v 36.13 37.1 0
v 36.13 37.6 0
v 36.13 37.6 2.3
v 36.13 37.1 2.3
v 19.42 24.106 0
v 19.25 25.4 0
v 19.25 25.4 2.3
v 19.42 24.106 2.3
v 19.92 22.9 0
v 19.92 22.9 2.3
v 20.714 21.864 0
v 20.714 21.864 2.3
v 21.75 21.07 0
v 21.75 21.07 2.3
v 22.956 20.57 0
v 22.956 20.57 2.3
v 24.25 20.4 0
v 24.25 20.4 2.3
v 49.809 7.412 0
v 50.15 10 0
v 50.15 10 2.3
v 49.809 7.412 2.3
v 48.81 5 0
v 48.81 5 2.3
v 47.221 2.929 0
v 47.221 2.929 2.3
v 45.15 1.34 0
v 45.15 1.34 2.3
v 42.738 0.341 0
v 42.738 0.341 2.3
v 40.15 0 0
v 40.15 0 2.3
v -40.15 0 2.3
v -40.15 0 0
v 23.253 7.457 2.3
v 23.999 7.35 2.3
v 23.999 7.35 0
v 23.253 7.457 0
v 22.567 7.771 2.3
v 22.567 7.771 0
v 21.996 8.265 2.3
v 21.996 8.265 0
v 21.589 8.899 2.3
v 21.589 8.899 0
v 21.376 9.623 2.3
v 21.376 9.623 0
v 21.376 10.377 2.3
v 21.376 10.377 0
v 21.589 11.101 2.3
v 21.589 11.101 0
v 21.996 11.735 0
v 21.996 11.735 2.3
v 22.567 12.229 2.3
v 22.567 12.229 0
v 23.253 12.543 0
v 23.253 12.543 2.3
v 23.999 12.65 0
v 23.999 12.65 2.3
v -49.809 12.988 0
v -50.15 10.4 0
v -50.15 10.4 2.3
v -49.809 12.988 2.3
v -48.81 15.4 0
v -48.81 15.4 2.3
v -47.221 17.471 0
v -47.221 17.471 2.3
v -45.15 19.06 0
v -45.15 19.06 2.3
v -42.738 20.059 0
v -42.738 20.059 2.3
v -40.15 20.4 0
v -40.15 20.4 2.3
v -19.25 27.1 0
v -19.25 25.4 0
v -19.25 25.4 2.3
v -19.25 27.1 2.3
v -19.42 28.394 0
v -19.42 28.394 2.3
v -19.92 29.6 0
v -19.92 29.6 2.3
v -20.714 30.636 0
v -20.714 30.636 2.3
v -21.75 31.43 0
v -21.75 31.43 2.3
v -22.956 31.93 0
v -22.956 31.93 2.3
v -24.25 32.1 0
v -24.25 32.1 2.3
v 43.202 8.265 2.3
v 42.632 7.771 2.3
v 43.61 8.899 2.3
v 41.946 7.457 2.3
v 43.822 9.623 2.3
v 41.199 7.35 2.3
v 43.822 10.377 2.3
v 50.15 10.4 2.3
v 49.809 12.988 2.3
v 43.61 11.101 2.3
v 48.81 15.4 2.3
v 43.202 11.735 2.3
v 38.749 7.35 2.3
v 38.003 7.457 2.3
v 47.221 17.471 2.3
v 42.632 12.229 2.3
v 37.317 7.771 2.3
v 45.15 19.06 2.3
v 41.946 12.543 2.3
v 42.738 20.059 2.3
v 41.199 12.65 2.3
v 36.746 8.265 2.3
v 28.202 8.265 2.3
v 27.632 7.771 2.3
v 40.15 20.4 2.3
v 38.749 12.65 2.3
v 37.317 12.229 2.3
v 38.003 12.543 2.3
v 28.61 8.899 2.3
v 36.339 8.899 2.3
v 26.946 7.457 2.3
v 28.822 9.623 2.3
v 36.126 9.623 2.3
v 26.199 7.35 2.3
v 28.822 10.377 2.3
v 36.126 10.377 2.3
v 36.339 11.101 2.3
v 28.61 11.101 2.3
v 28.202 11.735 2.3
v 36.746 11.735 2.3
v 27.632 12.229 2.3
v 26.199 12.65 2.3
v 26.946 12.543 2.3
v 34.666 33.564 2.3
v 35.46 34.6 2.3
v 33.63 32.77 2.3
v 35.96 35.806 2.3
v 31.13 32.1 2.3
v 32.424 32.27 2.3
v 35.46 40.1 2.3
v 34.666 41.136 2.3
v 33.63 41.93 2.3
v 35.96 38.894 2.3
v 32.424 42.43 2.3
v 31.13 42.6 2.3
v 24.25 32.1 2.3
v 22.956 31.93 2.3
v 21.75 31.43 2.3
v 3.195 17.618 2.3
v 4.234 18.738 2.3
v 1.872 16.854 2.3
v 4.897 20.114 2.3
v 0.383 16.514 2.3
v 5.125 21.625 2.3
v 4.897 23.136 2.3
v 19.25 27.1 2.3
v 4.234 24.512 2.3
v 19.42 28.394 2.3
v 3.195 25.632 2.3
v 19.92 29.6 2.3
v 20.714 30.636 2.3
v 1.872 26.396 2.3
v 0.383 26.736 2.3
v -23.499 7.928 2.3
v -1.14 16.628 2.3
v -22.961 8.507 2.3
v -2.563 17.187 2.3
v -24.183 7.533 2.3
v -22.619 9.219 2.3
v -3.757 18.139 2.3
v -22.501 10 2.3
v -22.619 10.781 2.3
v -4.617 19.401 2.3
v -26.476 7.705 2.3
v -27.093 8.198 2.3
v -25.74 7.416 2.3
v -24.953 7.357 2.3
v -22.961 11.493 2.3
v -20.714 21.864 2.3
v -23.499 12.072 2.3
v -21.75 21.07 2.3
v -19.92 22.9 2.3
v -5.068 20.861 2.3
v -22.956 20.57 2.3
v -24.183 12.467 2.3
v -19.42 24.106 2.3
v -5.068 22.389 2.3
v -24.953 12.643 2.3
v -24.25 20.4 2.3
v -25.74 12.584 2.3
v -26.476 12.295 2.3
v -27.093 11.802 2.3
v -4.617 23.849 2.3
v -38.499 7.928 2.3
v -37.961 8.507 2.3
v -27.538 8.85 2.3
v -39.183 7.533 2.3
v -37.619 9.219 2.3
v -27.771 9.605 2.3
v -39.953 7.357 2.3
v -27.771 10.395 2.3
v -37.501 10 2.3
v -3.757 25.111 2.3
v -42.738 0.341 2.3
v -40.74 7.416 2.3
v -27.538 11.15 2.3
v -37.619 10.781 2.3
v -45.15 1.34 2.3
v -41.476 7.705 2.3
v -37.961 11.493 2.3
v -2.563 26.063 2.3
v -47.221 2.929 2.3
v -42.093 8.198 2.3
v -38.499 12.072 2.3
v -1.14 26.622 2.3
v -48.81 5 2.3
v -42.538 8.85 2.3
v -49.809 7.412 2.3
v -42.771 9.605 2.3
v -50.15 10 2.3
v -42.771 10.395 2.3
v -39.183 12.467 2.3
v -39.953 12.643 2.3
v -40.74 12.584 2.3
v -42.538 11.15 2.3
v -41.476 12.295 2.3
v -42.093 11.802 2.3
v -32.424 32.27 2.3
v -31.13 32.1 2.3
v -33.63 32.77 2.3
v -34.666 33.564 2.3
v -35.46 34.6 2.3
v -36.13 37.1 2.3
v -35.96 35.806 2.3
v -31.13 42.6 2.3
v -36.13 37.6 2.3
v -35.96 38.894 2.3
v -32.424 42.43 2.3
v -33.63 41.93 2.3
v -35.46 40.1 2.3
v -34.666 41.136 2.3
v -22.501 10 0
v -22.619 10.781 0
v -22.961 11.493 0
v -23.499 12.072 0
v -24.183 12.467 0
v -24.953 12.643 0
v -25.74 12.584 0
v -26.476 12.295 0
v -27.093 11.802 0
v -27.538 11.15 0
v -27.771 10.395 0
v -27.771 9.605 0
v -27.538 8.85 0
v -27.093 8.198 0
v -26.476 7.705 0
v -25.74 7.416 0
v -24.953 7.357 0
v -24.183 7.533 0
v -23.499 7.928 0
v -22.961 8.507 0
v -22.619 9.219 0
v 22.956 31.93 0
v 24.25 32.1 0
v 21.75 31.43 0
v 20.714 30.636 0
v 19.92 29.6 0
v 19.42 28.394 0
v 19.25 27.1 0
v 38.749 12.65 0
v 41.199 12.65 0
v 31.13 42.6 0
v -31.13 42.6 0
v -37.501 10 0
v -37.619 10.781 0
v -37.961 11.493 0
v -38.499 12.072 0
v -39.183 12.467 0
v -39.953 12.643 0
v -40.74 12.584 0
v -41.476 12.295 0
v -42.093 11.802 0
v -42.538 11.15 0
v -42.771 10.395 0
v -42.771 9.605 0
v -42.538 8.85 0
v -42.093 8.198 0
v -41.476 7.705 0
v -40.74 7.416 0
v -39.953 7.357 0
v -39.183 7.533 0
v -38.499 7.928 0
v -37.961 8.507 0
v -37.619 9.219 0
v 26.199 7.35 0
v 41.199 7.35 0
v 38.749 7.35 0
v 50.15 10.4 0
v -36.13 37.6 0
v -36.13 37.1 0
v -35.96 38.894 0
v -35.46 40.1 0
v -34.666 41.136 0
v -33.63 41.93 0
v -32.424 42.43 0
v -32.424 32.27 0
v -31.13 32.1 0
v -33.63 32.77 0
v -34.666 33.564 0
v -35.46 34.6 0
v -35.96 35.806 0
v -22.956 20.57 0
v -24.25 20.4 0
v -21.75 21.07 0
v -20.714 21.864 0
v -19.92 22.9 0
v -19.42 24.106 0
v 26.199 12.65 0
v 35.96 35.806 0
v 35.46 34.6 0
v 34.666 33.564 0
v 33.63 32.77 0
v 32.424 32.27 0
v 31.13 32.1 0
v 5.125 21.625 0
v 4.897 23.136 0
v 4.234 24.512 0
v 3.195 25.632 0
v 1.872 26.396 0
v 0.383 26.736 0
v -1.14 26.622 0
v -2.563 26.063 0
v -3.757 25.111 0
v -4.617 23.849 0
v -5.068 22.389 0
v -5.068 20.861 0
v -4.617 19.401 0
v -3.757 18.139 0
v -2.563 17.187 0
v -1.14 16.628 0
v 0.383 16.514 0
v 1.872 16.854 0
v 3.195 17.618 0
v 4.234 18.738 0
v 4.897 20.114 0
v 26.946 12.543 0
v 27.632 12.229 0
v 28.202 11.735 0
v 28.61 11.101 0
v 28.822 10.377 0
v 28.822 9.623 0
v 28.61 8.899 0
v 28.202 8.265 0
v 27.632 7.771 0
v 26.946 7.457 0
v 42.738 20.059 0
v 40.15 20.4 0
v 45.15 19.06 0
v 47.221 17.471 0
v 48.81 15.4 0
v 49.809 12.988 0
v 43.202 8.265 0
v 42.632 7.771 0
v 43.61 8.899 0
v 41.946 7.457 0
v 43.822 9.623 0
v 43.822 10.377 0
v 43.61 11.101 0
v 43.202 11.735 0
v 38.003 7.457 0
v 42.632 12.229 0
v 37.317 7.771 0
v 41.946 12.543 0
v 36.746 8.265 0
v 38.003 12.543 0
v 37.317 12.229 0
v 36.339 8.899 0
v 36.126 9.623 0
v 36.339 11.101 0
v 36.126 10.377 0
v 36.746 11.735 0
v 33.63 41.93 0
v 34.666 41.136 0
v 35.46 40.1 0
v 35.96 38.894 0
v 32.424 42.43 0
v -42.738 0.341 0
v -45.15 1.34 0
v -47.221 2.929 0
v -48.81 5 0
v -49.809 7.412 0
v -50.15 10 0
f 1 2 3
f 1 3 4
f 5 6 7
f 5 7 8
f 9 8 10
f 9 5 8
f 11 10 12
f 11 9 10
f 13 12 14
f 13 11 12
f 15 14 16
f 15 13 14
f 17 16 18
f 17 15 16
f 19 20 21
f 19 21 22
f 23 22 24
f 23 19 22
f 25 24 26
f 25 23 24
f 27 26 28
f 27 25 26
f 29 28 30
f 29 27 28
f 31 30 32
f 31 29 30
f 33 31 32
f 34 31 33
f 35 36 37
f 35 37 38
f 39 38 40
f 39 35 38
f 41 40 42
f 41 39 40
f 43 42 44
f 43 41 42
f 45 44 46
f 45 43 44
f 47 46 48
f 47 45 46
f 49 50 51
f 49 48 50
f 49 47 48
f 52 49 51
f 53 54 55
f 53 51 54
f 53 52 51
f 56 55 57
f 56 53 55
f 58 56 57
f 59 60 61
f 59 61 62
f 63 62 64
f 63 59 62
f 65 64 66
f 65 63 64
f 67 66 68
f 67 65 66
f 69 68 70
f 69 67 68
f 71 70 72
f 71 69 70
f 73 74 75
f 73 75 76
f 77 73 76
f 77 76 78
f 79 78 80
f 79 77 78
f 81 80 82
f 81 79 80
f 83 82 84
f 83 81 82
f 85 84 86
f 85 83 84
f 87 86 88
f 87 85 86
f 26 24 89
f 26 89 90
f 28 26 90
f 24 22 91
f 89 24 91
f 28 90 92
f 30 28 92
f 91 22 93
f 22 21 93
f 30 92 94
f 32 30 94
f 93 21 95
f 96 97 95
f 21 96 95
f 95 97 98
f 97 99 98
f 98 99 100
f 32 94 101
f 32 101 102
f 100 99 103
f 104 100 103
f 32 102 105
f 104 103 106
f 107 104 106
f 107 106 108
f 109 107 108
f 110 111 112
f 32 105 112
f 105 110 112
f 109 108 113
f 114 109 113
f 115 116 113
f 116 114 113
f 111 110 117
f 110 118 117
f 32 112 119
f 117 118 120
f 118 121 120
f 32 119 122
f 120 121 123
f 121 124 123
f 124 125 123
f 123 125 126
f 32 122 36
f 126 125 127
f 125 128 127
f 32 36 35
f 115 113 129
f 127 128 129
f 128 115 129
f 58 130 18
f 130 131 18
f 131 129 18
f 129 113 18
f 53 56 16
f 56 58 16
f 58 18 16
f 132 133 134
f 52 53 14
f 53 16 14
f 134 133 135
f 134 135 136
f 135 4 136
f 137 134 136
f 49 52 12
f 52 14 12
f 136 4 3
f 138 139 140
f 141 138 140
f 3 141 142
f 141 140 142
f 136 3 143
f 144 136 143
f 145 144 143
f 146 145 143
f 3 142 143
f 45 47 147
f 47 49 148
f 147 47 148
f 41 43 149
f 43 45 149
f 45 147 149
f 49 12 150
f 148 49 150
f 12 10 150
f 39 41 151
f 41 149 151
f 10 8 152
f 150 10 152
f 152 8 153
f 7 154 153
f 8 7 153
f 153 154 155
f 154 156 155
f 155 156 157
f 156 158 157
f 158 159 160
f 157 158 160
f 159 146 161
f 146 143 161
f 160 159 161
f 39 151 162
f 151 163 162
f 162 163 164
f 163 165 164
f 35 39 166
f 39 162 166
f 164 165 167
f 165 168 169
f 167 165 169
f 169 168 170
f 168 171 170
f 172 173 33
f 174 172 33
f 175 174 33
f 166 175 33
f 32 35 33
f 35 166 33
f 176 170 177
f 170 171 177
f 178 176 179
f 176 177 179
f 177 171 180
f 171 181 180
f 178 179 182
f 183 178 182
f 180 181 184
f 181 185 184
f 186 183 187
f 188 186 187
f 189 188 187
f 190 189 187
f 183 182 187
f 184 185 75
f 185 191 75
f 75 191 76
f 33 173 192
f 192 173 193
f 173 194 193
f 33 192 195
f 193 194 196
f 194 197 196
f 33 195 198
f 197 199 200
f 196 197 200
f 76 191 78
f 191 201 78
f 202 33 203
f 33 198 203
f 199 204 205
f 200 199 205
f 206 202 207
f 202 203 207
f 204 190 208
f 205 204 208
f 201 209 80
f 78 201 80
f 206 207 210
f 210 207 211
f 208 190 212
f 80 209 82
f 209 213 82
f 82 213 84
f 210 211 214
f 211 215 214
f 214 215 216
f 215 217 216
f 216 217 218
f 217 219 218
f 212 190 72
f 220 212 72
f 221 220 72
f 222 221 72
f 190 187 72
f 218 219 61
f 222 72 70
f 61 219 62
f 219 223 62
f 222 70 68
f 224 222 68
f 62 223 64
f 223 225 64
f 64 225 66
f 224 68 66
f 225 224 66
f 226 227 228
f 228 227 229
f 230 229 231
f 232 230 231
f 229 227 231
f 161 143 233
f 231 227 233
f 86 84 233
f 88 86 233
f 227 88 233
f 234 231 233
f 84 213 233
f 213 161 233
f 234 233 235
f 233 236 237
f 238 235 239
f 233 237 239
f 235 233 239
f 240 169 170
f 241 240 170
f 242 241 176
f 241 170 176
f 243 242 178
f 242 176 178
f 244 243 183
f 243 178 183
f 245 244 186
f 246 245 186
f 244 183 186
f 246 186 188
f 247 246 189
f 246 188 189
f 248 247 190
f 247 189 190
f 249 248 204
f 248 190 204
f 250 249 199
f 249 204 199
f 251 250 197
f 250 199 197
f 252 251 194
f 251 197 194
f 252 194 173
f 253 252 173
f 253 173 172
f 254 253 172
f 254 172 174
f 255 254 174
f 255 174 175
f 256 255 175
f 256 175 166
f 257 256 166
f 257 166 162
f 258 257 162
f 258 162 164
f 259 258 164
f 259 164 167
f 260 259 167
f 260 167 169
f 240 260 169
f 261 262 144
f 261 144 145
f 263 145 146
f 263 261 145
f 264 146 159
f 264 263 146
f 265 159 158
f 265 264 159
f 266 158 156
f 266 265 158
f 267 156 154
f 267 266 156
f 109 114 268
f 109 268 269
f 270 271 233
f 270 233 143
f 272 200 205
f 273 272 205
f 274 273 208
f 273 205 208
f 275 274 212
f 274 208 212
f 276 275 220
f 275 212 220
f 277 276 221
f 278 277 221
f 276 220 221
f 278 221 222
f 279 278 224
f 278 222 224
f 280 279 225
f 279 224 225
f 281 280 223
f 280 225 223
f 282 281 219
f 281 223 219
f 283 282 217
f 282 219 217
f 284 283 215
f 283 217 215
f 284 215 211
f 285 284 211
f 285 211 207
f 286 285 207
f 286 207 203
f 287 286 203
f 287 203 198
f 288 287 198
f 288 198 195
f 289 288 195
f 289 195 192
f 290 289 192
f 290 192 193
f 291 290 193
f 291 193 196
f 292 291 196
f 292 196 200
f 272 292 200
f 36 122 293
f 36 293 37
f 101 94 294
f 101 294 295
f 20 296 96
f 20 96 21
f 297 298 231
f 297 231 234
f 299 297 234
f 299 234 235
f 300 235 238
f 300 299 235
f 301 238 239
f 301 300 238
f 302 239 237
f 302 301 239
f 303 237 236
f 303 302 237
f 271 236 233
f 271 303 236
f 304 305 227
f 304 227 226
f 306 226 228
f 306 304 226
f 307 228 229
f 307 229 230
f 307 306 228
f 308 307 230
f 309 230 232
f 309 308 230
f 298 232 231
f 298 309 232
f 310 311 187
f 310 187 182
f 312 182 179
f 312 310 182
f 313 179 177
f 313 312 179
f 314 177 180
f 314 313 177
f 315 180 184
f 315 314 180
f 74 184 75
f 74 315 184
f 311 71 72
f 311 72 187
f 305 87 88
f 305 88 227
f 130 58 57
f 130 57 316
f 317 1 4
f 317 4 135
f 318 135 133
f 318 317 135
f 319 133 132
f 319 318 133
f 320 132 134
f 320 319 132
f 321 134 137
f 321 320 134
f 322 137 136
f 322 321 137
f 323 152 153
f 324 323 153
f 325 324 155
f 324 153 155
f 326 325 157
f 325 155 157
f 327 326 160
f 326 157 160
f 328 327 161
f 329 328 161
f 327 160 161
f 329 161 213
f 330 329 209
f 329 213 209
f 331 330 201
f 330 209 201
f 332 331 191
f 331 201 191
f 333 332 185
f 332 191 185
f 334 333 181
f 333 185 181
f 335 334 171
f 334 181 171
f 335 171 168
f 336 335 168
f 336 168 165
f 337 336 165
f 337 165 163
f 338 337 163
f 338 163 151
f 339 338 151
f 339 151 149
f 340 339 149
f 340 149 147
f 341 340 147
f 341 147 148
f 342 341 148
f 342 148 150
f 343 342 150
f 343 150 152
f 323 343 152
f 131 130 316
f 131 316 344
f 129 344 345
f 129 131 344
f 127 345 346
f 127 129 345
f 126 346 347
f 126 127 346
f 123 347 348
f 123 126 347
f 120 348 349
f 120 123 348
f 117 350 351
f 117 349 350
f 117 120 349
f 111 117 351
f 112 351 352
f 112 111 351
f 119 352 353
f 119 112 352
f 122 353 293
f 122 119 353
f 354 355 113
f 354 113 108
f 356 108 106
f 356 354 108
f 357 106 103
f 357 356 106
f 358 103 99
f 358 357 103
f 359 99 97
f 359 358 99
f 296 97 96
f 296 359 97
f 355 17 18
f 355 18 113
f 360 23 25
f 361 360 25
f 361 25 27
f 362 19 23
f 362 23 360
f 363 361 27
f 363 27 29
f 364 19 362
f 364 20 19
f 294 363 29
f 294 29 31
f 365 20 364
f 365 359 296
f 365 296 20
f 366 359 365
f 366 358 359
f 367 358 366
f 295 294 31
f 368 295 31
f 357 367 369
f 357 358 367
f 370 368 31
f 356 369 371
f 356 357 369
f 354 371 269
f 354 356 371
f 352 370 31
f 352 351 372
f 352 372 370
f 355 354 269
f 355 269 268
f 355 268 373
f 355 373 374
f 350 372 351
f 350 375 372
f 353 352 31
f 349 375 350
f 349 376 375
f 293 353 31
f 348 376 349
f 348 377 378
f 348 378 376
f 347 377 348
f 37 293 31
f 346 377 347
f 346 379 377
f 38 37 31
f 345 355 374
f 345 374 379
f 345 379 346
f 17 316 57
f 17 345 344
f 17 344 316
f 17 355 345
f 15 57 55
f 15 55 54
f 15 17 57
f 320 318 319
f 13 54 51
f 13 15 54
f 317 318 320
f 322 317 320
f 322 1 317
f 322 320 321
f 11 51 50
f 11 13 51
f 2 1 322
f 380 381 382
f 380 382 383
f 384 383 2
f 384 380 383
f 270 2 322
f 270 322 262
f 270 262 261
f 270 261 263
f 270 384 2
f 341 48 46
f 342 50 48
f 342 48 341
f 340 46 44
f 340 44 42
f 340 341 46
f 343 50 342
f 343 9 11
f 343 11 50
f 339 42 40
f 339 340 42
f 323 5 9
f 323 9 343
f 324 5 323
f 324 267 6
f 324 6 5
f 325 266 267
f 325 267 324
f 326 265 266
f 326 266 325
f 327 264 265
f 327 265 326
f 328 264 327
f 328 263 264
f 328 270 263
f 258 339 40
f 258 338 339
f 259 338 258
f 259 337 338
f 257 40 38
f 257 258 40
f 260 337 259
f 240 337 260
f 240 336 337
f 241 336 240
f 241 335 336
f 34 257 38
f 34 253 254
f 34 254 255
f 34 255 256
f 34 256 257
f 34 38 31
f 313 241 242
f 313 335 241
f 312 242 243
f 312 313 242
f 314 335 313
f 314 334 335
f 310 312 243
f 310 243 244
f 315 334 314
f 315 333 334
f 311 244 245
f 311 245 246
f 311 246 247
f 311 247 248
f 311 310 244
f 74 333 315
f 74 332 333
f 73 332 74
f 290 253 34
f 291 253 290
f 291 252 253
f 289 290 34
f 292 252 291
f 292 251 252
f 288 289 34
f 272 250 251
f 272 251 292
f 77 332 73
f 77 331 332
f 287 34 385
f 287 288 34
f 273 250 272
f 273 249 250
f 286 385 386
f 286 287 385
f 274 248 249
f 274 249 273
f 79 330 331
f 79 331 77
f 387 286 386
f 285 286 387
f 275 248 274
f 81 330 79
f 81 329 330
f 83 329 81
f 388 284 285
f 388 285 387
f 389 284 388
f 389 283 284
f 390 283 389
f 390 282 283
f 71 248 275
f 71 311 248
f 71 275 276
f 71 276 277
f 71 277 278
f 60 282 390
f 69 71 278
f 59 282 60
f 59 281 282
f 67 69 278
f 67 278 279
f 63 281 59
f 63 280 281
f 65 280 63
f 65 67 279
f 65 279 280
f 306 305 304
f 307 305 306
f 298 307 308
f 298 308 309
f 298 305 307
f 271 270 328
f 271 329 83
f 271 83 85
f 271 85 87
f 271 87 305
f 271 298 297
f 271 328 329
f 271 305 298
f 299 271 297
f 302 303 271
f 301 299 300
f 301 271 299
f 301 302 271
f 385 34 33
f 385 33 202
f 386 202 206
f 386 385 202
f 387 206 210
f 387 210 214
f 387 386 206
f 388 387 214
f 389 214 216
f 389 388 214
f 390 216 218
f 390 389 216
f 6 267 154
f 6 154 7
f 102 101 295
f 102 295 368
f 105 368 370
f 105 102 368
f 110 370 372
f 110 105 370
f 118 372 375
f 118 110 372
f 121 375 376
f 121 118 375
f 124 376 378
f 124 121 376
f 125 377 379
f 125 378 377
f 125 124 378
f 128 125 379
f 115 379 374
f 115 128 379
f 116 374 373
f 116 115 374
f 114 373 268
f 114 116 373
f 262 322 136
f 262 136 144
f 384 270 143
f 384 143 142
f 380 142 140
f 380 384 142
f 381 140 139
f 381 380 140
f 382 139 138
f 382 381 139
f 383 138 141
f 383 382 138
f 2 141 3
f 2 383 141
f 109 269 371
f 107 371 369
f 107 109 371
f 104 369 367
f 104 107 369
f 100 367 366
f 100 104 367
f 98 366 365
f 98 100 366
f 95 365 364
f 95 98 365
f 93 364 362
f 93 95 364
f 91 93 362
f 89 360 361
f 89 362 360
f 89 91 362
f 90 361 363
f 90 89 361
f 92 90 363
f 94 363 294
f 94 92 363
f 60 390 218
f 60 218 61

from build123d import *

# Parameters (mm, degrees)
BOSS_EXTRUDE1_DEPTH = 2.3
CUT_EXTRUDE1_REACH  = 4.3
SKETCH2_R           = 2.65
SKETCH2_R_2         = 5.125


with BuildPart() as part:
    # Sketch1 → Boss-Extrude1 (new body)
    with BuildSketch(Plane.XY):
        with BuildLine():
            Line((40.15, 0), (-40.15, 0))
            ThreePointArc((-40.15, 0), (-47.221067812, 2.928932188), (-50.15, 10))
            Line((-50.15, 10), (-50.15, 10.4))
            ThreePointArc((-50.15, 10.4), (-47.221067812, 17.471067812), (-40.15, 20.4))
            Line((-40.15, 20.4), (-24.25, 20.4))
            ThreePointArc((-24.25, 20.4), (-20.714466094, 21.864466094), (-19.25, 25.4))
            Line((-19.25, 25.4), (-19.25, 27.1))
            ThreePointArc((-19.25, 27.1), (-20.714466094, 30.635533906), (-24.25, 32.1))
            Line((-24.25, 32.1), (-31.13, 32.1))
            ThreePointArc((-31.13, 32.1), (-34.665533906, 33.564466094), (-36.13, 37.1))
            Line((-36.13, 37.1), (-36.13, 37.6))
            ThreePointArc((-36.13, 37.6), (-34.665533906, 41.135533906), (-31.13, 42.6))
            Line((-31.13, 42.6), (31.13, 42.6))
            ThreePointArc((31.13, 42.6), (34.665533906, 41.135533906), (36.13, 37.6))
            Line((36.13, 37.6), (36.13, 37.1))
            ThreePointArc((36.13, 37.1), (34.665533906, 33.564466094), (31.13, 32.1))
            Line((31.13, 32.1), (24.25, 32.1))
            ThreePointArc((24.25, 32.1), (20.714466094, 30.635533906), (19.25, 27.1))
            Line((19.25, 27.1), (19.25, 25.4))
            ThreePointArc((19.25, 25.4), (20.714466094, 21.864466094), (24.25, 20.4))
            Line((24.25, 20.4), (40.15, 20.4))
            ThreePointArc((40.15, 20.4), (47.221067812, 17.471067812), (50.15, 10.4))
            Line((50.15, 10.4), (50.15, 10))
            ThreePointArc((50.15, 10), (47.221067812, 2.928932188), (40.15, 0))
        make_face()
    extrude(amount=BOSS_EXTRUDE1_DEPTH)

    # Sketch2 → Cut-Extrude1 (cut, up to next)
    with BuildSketch(Plane.XY.offset(2.3), mode=Mode.PRIVATE) as cut_extrude1_sk1:
        with Locations((-40.150797604, 10)):
            Circle(SKETCH2_R)
    cut_extrude1_tool1 = extrude(cut_extrude1_sk1.sketch, amount=-CUT_EXTRUDE1_REACH, mode=Mode.PRIVATE) & part.part
    add(cut_extrude1_tool1.solids().sort_by_distance((-40.150798, 10, 2.3))[0], mode=Mode.SUBTRACT)
    # Sketch2 → Cut-Extrude1 (cut, up to next)
    with BuildSketch(Plane.XY.offset(2.3), mode=Mode.PRIVATE) as cut_extrude1_sk2:
        with Locations((-25.150797604, 10)):
            Circle(SKETCH2_R)
    cut_extrude1_tool2 = extrude(cut_extrude1_sk2.sketch, amount=-CUT_EXTRUDE1_REACH, mode=Mode.PRIVATE) & part.part
    add(cut_extrude1_tool2.solids().sort_by_distance((-25.150798, 10, 2.3))[0], mode=Mode.SUBTRACT)
    # Sketch2 → Cut-Extrude1 (cut, up to next)
    with BuildSketch(Plane.XY.offset(2.3), mode=Mode.PRIVATE) as cut_extrude1_sk3:
        with Locations((0, 21.625)):
            Circle(SKETCH2_R_2)
    cut_extrude1_tool3 = extrude(cut_extrude1_sk3.sketch, amount=-CUT_EXTRUDE1_REACH, mode=Mode.PRIVATE) & part.part
    add(cut_extrude1_tool3.solids().sort_by_distance((0, 21.625, 2.3))[0], mode=Mode.SUBTRACT)
    # Sketch2 → Cut-Extrude1 (cut, up to next)
    with BuildSketch(Plane.XY.offset(2.3), mode=Mode.PRIVATE) as cut_extrude1_sk4:
        with BuildLine():
            Line((23.999202396, 12.65), (26.199202396, 12.65))
            ThreePointArc((26.199202396, 12.65), (28.849202396, 10), (26.199202396, 7.35))
            Line((26.199202396, 7.35), (23.999202396, 7.35))
            ThreePointArc((23.999202396, 7.35), (21.349202396, 10), (23.999202396, 12.65))
        make_face()
    cut_extrude1_tool4 = extrude(cut_extrude1_sk4.sketch, amount=-CUT_EXTRUDE1_REACH, mode=Mode.PRIVATE) & part.part
    add(cut_extrude1_tool4.solids().sort_by_distance((25.099202, 10, 2.3))[0], mode=Mode.SUBTRACT)
    # Sketch2 → Cut-Extrude1 (cut, up to next)
    with BuildSketch(Plane.XY.offset(2.3), mode=Mode.PRIVATE) as cut_extrude1_sk5:
        with BuildLine():
            Line((38.749202396, 12.65), (41.199202396, 12.65))
            ThreePointArc((41.199202396, 12.65), (43.849202396, 10), (41.199202396, 7.35))
            Line((41.199202396, 7.35), (38.749202396, 7.35))
            ThreePointArc((38.749202396, 7.35), (36.099202396, 10), (38.749202396, 12.65))
        make_face()
    cut_extrude1_tool5 = extrude(cut_extrude1_sk5.sketch, amount=-CUT_EXTRUDE1_REACH, mode=Mode.PRIVATE) & part.part
    add(cut_extrude1_tool5.solids().sort_by_distance((39.974202, 10, 2.3))[0], mode=Mode.SUBTRACT)


solid = part.part
